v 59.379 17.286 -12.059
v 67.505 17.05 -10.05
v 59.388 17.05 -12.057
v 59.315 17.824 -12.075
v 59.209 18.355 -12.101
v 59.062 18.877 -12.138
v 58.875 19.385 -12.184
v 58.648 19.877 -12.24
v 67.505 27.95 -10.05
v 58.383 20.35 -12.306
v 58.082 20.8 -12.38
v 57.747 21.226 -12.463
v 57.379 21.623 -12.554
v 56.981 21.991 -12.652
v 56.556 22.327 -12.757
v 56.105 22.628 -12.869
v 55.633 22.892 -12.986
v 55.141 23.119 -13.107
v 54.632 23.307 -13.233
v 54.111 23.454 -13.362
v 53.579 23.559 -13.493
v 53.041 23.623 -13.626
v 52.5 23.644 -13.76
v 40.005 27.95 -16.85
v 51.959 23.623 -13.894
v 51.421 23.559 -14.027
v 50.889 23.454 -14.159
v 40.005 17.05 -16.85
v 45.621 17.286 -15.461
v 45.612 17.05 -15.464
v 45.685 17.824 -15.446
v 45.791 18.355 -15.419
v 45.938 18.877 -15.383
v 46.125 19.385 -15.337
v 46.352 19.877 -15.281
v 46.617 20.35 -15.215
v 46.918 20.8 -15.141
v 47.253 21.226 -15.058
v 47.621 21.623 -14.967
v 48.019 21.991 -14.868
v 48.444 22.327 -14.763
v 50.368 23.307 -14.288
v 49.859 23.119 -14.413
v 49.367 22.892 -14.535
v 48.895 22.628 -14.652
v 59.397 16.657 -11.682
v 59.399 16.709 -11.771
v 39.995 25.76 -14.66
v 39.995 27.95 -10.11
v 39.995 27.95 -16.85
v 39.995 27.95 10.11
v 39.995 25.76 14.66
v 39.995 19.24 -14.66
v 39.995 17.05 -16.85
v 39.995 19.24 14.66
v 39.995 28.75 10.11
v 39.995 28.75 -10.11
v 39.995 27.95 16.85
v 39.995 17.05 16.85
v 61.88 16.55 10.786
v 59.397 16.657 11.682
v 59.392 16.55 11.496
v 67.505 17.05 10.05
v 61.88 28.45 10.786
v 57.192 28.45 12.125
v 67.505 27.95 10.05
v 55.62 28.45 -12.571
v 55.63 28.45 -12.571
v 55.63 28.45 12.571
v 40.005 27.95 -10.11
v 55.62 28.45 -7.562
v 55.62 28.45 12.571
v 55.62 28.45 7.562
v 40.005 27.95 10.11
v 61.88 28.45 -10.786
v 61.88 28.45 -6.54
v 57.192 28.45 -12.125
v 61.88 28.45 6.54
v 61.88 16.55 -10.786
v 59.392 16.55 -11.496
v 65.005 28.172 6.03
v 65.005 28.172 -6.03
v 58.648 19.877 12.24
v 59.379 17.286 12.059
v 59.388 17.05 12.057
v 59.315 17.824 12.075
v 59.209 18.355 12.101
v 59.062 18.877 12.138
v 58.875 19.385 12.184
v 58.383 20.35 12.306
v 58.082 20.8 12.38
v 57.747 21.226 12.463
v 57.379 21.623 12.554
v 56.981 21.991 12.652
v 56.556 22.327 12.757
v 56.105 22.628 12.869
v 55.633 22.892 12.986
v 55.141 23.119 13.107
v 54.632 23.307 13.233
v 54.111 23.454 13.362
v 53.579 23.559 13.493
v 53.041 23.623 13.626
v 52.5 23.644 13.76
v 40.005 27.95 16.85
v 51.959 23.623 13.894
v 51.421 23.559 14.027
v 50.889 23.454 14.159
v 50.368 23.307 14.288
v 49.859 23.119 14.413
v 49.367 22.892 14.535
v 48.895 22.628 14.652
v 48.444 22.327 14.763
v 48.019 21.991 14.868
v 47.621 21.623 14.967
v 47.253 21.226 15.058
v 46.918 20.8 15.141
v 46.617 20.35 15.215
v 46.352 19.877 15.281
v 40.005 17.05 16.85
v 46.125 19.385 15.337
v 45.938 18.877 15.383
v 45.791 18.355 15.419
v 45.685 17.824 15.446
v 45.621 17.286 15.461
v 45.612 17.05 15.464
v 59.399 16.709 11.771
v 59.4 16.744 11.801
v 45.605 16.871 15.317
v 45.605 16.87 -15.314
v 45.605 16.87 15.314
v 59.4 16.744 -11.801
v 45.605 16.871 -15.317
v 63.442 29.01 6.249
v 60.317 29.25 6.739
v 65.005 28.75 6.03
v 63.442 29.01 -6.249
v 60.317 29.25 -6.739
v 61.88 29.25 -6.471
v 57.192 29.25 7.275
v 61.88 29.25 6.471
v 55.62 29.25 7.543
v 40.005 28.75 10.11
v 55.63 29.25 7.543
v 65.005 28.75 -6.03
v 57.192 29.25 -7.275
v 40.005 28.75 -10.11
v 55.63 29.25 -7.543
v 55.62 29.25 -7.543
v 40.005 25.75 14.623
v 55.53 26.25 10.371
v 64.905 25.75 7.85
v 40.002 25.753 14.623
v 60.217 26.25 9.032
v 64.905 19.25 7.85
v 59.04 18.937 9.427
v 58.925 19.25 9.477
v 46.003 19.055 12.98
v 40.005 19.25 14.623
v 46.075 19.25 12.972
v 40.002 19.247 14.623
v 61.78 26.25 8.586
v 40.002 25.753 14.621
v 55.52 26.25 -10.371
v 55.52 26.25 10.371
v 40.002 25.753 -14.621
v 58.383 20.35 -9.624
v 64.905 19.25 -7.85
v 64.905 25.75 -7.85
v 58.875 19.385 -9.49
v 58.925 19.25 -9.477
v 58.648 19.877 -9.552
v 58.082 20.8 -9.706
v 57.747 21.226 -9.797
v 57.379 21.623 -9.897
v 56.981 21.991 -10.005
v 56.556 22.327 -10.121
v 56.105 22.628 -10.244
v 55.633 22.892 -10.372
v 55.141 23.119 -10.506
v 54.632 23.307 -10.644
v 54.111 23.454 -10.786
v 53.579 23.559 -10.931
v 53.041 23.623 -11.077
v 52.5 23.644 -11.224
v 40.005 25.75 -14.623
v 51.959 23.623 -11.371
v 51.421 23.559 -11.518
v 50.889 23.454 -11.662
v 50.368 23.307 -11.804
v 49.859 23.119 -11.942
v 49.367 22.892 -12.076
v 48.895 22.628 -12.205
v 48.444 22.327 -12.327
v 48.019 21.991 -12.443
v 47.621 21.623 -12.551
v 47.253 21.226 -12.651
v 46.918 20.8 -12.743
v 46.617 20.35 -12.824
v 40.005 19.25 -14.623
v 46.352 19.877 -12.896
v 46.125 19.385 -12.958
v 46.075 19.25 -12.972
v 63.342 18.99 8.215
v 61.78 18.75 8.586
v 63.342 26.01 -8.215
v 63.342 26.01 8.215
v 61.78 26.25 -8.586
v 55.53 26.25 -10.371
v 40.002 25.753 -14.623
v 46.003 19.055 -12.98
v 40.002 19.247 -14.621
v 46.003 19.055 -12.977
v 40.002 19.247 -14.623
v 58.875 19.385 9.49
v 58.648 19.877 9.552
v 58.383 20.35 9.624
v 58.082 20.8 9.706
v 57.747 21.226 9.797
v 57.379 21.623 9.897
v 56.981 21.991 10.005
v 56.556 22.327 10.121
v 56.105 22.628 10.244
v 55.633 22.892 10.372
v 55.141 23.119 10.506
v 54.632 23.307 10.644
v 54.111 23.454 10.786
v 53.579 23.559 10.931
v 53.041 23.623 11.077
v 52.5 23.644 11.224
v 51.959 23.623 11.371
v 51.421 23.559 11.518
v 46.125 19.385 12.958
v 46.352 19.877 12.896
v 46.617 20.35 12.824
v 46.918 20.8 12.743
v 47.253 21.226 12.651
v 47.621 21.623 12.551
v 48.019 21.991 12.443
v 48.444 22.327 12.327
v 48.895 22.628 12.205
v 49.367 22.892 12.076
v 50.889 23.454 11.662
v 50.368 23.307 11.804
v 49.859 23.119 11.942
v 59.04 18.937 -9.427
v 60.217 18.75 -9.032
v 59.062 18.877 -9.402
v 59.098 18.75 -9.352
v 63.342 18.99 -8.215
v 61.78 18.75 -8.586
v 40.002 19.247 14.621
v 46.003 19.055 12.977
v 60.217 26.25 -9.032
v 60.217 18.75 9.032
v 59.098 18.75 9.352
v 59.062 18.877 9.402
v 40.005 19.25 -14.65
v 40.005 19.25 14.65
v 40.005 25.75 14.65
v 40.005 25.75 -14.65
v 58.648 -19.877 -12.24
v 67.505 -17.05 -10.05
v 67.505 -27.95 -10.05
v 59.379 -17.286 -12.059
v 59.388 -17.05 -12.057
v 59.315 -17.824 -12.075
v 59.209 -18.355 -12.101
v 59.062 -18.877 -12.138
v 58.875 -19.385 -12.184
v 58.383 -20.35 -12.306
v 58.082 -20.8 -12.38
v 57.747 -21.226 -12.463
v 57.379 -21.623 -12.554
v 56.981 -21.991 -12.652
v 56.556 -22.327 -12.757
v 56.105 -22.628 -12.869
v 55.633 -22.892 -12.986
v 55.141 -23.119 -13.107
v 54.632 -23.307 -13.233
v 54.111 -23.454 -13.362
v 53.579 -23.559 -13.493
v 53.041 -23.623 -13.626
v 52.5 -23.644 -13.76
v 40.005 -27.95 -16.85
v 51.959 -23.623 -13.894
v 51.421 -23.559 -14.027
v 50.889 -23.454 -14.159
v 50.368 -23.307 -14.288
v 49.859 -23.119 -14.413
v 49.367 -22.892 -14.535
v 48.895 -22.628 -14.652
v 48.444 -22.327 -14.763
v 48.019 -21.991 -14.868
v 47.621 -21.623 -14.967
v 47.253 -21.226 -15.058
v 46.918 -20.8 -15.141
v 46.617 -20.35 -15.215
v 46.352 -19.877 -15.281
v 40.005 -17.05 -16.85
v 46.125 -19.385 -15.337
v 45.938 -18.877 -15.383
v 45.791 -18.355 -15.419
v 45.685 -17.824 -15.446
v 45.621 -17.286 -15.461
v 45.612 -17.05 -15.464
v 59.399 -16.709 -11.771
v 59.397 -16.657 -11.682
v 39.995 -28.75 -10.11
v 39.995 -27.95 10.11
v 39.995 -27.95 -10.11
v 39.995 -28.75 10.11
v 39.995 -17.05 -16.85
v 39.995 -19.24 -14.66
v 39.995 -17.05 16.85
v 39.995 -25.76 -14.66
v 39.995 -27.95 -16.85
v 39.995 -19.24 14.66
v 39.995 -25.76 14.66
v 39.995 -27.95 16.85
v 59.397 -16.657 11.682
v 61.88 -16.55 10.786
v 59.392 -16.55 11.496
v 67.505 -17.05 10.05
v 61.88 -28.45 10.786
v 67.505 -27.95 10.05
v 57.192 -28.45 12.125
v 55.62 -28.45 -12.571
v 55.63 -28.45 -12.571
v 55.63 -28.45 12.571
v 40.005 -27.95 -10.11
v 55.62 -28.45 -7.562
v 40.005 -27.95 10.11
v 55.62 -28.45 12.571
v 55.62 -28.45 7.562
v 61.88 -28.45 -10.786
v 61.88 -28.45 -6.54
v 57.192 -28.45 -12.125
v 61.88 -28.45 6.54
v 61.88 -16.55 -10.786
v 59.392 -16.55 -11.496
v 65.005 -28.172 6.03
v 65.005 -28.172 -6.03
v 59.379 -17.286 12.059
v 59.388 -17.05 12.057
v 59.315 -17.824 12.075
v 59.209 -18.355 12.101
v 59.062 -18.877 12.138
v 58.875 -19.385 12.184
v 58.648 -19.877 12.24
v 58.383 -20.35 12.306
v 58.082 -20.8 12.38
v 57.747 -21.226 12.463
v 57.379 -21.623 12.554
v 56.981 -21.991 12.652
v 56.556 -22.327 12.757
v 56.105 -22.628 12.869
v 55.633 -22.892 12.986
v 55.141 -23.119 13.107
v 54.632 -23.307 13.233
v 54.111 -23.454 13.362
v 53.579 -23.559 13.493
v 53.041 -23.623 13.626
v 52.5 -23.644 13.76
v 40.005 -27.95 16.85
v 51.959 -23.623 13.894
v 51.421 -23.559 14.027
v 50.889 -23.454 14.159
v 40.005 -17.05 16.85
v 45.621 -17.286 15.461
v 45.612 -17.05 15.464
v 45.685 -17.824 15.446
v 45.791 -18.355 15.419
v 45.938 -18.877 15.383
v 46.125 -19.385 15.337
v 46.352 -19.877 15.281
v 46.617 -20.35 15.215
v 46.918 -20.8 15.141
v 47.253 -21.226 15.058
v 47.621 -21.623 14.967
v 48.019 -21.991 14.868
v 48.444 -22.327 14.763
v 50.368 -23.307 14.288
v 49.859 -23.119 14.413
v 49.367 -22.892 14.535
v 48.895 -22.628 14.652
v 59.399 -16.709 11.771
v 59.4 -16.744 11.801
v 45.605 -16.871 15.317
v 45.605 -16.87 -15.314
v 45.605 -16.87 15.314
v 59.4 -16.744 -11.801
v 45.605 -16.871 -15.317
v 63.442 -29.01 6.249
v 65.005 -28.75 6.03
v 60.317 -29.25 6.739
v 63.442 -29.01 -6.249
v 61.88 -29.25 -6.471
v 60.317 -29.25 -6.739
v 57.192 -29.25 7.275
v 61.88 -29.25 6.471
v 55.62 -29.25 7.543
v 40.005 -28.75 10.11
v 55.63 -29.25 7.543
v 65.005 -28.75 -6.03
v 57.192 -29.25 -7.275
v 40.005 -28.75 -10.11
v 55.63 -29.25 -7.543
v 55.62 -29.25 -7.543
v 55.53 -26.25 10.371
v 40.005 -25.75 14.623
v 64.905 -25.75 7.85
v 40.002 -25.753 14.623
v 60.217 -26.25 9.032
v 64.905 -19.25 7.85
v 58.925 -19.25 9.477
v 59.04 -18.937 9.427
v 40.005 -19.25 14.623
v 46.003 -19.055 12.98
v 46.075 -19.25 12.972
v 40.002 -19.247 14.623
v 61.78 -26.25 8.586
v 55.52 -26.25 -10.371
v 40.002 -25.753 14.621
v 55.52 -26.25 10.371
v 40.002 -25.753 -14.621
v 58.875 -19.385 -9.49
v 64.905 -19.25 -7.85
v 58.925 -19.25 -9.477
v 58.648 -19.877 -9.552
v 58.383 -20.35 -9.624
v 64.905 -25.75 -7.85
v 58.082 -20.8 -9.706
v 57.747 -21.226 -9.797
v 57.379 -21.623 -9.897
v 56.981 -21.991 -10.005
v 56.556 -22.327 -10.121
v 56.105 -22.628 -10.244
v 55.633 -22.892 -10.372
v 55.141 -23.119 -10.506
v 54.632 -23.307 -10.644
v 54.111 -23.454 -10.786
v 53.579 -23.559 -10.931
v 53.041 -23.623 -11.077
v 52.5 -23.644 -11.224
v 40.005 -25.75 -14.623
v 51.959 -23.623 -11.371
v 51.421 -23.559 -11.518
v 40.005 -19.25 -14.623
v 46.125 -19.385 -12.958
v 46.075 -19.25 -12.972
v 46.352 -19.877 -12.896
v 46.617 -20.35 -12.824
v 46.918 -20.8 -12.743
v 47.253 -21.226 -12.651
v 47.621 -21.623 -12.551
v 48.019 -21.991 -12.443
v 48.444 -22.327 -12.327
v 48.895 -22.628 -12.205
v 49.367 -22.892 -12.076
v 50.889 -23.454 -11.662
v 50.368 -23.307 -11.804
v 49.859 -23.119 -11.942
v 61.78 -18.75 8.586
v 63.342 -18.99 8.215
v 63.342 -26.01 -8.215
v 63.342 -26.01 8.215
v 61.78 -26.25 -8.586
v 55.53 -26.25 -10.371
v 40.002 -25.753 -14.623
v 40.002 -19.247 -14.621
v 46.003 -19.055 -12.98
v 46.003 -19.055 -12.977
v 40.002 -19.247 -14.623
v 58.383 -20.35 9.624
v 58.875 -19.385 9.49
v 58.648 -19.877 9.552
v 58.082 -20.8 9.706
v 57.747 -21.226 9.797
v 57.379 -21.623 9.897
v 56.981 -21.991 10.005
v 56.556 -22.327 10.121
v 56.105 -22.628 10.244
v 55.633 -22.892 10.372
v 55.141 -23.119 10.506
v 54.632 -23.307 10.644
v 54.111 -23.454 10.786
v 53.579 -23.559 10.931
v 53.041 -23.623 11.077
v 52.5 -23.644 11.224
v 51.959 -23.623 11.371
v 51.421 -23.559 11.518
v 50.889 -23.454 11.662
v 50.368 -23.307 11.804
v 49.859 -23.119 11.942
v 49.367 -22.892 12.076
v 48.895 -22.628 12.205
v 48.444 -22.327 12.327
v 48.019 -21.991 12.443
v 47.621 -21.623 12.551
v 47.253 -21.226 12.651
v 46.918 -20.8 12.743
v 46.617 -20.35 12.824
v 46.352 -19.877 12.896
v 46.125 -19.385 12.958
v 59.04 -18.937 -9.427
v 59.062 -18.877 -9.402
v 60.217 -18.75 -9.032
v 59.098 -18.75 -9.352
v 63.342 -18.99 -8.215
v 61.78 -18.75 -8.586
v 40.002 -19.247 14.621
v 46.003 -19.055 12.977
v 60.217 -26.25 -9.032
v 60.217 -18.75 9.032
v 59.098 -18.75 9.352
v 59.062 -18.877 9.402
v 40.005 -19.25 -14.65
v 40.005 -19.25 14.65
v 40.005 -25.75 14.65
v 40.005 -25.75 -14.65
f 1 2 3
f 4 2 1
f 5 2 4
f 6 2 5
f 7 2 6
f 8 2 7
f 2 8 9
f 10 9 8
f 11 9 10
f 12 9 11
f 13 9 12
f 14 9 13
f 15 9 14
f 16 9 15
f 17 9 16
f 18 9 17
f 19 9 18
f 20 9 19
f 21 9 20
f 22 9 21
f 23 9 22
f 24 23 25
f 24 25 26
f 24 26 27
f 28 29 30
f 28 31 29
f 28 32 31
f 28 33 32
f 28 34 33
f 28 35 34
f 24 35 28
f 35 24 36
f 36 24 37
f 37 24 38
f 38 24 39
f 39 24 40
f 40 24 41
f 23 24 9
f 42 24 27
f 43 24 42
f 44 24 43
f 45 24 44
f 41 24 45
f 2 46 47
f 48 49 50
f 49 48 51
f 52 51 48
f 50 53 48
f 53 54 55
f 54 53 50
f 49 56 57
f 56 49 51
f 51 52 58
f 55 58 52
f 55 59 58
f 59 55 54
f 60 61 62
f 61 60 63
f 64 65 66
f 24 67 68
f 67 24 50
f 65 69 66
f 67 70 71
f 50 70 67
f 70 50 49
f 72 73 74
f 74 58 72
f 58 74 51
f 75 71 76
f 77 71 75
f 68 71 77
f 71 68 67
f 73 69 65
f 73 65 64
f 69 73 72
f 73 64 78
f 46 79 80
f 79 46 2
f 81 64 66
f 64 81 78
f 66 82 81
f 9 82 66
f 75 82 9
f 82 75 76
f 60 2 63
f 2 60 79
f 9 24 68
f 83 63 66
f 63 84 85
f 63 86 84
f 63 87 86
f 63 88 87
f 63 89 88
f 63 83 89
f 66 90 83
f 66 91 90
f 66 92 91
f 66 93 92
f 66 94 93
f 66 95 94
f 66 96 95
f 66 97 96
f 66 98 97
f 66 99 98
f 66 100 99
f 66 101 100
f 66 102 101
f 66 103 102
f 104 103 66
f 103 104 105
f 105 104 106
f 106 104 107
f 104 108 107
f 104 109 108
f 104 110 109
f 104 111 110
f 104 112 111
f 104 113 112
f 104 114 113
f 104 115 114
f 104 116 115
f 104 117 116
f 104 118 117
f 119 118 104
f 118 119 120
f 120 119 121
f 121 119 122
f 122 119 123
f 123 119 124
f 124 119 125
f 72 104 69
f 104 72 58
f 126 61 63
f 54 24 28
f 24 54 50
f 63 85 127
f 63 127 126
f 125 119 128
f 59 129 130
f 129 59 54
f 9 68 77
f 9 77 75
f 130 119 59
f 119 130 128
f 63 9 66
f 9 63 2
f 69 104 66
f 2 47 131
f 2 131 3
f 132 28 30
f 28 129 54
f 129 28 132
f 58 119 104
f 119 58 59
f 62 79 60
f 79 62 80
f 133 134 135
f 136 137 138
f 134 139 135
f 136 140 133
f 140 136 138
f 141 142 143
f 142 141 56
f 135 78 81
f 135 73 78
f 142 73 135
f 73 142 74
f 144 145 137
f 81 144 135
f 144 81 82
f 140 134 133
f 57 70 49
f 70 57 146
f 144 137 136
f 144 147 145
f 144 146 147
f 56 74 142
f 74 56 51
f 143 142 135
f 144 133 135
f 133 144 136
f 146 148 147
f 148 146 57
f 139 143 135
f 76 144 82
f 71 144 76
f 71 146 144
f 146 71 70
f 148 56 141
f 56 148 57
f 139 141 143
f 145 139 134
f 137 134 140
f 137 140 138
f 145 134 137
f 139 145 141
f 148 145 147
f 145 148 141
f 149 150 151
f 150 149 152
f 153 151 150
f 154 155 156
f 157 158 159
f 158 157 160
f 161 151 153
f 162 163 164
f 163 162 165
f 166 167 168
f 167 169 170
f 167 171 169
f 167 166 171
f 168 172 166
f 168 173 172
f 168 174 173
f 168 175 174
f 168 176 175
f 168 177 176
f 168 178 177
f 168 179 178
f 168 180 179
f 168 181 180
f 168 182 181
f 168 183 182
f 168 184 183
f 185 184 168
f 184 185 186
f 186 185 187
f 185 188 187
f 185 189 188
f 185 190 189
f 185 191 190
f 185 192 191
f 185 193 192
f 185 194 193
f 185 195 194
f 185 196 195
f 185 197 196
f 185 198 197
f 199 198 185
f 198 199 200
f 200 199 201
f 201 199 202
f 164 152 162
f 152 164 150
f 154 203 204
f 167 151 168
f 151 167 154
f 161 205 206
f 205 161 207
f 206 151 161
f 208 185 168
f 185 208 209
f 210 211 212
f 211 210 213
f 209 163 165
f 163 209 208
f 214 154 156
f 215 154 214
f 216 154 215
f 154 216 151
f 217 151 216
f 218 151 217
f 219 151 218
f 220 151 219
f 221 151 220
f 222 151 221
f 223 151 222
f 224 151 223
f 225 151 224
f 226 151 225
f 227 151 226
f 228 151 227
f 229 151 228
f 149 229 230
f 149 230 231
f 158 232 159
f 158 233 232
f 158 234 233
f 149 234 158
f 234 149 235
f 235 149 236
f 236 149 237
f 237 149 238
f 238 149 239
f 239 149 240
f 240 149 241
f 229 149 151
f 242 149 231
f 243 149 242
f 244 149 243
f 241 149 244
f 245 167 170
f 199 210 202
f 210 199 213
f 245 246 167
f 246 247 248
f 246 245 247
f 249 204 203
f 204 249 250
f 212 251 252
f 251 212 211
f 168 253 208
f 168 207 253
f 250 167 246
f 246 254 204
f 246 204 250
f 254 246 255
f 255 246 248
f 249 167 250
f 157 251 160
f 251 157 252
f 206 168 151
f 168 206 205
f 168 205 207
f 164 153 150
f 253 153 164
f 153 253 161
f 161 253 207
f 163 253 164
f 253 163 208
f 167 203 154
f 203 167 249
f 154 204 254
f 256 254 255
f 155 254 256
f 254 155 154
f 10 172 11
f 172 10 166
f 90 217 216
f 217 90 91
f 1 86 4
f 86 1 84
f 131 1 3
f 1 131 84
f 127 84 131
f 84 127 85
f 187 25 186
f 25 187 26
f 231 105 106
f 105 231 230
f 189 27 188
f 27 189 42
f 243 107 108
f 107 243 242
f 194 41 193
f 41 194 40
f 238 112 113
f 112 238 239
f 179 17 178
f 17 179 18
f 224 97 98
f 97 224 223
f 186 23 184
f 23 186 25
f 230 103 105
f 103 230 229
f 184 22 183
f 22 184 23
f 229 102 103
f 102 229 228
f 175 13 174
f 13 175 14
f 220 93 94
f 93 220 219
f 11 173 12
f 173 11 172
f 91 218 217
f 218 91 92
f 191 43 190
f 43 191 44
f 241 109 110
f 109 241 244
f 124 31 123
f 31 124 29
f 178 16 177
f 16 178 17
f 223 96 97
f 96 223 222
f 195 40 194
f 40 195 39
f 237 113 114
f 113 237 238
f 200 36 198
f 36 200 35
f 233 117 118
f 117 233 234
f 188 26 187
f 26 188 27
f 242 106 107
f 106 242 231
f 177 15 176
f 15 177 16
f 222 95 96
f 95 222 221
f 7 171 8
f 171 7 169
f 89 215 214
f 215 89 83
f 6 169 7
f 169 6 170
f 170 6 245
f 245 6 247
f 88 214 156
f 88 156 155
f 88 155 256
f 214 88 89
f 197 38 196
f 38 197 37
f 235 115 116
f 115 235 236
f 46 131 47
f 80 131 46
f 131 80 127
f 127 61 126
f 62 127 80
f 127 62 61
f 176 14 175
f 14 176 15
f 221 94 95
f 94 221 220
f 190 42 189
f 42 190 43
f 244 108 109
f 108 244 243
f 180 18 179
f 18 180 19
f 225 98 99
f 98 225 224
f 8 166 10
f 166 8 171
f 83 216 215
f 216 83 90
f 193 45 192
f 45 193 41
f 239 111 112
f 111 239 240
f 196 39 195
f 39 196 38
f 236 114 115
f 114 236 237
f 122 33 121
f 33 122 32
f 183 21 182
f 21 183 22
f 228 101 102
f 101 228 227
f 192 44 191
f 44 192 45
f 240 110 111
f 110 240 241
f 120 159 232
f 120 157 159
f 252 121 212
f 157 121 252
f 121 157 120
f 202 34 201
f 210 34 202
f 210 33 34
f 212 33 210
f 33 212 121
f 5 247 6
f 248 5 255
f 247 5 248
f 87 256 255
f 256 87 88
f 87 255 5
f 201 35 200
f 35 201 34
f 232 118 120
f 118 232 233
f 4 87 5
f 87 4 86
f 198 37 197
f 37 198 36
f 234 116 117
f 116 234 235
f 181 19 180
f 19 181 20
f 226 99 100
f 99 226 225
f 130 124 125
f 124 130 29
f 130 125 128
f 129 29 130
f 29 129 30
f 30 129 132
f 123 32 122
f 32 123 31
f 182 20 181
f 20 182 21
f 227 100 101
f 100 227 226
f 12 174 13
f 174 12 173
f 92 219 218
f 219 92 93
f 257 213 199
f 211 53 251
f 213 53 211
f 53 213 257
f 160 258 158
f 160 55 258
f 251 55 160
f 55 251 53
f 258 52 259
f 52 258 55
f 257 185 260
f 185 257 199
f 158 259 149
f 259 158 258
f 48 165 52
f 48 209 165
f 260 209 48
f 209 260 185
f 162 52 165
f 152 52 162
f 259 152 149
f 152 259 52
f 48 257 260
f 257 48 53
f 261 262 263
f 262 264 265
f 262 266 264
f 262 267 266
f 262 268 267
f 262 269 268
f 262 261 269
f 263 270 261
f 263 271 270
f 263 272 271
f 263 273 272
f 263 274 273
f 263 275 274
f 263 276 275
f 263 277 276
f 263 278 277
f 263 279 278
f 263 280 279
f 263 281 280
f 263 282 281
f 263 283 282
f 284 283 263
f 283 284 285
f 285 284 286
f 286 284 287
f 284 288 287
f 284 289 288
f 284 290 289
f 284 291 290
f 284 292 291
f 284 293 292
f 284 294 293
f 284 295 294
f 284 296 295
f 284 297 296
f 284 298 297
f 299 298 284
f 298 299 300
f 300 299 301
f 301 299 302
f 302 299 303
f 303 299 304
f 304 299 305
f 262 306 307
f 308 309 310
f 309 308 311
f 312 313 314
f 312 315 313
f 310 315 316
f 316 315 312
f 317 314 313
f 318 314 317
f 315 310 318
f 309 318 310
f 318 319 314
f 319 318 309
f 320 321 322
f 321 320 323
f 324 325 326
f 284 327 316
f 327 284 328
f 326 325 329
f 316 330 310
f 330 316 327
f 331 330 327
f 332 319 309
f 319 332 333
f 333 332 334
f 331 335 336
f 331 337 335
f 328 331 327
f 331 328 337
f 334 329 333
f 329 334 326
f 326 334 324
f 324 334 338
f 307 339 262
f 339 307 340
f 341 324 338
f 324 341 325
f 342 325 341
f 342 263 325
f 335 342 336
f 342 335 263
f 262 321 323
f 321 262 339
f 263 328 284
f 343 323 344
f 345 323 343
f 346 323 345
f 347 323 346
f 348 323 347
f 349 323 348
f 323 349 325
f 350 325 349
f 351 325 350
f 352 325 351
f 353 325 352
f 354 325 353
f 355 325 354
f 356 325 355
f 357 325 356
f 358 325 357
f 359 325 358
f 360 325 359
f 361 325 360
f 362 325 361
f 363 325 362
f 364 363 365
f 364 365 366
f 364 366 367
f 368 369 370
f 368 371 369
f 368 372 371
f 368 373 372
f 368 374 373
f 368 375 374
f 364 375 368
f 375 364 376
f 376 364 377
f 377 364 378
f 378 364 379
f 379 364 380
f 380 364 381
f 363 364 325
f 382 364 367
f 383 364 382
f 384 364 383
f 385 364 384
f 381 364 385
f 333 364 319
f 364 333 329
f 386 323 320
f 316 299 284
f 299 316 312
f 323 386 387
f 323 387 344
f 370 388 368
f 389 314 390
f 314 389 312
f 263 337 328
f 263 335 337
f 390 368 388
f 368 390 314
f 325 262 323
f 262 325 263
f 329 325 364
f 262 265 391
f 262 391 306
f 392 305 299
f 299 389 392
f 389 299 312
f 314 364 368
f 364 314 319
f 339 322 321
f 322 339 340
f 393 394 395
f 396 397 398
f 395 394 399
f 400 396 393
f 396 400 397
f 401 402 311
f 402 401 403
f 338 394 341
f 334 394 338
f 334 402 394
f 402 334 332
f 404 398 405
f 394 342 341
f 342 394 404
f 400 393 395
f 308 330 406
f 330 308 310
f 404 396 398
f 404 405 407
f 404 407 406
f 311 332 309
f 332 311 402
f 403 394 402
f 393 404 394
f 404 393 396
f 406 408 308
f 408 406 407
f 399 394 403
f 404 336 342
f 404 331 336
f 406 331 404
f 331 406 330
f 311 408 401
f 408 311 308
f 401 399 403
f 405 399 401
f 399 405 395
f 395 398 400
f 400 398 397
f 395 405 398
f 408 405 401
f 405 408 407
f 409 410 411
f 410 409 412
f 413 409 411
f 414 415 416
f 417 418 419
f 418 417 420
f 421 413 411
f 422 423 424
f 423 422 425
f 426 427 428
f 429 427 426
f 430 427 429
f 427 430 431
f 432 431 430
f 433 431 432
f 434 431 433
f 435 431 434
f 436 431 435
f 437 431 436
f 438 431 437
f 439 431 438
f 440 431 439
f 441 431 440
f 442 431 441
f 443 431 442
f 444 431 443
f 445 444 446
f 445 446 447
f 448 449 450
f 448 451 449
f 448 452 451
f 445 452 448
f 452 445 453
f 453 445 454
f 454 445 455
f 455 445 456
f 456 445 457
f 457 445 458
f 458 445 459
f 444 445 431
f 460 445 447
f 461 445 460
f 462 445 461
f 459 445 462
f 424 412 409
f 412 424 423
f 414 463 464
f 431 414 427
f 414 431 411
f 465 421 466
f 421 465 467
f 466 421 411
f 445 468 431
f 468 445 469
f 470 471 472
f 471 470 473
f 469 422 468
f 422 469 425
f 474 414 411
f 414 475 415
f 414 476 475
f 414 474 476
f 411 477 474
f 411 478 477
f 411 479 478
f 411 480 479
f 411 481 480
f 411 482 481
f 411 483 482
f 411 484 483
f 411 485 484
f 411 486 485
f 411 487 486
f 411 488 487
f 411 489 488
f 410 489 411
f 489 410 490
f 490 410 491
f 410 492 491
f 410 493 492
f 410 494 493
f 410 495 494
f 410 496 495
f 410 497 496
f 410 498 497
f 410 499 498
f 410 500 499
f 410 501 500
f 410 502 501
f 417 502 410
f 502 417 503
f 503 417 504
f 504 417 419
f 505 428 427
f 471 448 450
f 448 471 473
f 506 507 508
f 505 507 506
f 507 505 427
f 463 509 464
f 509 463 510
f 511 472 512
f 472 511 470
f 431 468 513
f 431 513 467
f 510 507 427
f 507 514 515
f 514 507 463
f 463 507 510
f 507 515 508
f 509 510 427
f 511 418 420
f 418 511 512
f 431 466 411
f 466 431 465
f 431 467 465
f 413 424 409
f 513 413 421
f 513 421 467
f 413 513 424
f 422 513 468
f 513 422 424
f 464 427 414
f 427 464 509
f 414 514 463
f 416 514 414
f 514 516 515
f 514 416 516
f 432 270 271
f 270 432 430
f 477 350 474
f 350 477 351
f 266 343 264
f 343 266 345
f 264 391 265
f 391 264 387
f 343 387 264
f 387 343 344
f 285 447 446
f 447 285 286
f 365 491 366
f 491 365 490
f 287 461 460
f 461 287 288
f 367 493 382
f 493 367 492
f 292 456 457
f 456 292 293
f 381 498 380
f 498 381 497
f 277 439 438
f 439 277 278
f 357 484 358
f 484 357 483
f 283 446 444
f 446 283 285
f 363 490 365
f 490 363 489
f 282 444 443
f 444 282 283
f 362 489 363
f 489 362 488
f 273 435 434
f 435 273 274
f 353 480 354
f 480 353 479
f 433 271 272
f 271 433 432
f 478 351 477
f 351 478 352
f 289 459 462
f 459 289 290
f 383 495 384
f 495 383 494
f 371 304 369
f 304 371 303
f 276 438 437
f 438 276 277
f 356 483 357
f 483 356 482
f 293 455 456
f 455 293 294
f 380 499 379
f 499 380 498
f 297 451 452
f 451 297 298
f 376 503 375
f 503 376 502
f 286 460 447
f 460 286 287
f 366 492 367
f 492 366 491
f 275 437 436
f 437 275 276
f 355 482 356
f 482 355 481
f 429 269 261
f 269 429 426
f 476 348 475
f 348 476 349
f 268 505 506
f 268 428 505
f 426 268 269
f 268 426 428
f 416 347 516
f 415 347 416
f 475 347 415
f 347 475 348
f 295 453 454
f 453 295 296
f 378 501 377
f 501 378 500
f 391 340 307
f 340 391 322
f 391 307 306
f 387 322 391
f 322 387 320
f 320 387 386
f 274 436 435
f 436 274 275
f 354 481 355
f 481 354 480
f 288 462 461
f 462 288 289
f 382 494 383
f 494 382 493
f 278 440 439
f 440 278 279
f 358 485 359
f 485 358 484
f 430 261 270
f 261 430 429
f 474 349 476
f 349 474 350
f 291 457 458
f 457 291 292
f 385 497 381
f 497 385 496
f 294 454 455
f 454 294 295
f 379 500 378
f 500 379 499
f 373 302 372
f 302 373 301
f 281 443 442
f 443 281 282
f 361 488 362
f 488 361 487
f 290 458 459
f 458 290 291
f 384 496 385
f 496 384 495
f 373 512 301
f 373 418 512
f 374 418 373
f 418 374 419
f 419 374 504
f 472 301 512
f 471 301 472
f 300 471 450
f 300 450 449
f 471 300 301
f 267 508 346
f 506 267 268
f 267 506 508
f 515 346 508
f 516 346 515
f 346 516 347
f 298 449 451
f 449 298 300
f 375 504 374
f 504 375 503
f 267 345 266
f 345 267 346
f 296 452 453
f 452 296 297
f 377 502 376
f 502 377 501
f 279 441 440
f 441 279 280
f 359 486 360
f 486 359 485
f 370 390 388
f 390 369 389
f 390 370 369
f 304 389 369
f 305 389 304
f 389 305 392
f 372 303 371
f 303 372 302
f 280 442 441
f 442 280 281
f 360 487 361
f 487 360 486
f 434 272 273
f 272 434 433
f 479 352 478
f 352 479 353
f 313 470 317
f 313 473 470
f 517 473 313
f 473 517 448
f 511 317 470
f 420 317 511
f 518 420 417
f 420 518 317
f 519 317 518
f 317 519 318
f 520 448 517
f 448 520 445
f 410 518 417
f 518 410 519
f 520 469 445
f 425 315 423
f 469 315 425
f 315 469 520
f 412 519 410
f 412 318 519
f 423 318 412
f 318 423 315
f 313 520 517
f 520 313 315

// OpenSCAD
// ============================================================
//  OMX_F Gripper — Tube-Grip Tip Insert
//  Target: 13 mm OD glass test tube held VERTICALLY (tube axis = Z)
//  Zone  : blade X = 40 → 65 mm (finger-local frame)
//  Print : TPU 95A recommended (glass-safe, high friction)
//
//  Retention strategy (top-view layout along finger length)
//  ────────────────────────────────────────────────────────
//   X=40 ─── 45.6 ──── 59.4 ─── 65 ── 67.5
//   |  GRIP  |  CRADLE  |  GRIP  |CAP|
//    (-X wrap   (-Y cut    (+X wrap  (closed
//     full      for tube)   full)    tip past
//     blade)                          blade)
//
//   • GRIP zones: insert wraps blade on all 4 sides (Y±, Z±) →
//     friction fit + clip_lip on +Y face holds insert on blade.
//   • CAP: solid material past blade tip stops insert from sliding
//     off in +X direction. Blade tip butts against inside of cap.
//   • CRADLE: cylindrical cut (axis ‖ Z) on -Y face for vertical
//     tube. Two fingers' bites combine into full circle when closed.
//   • Mirrored in Y for link7 (inner face = +Y).
// ============================================================

// ── USER PARAMETERS ─────────────────────────────────────────

tube_od       = 13.0;   // target tube outer diameter (mm)
tube_clear    = 0.4;    // gap between tube and cradle (mm)
clearance     = 0.25;   // blade fit clearance (mm) — reduce if loose
wall          = 2.2;    // min wall around blade (mm)
clip_lip      = 0.8;    // snap-fit undercut depth on outer Y face (mm)
cap_thick     = 2.5;    // closed tip cap past blade tip (mm) — +X retention
cradle_x_frac = 0.5;    // tube center along insert X: 0=start, 1=end (0.5=mid)
cradle_sink   = 0.0;    // mm to recess tube center into +Y past inner face
                        //   0 = exact half-cylinder cut (cradle = half tube)
                        //   >0 = deeper bite (more grip, less Y material)
show_phantom  = false;  // show translucent blade for alignment check
which_finger  = "both"; // "link6" | "link7" | "both"

// ── BLADE CROSS-SECTION TABLE (X=40..65 zone) ───────────────
//   [ X, half_Y, half_Z ]  — measured via trimesh.section()
blade_pts = [
    [ 40, 3.0, 14.4 ],
    [ 46, 2.8, 12.7 ],
    [ 55, 3.5, 10.3 ],
    [ 62, 3.5,  8.3 ],
    [ 65, 3.0,  7.6 ],
];

X_START = 40;
X_END   = 65;
INS_LEN = X_END - X_START;  // 25 mm

// ── DERIVED ──────────────────────────────────────────────────
tube_r   = tube_od / 2;
cradle_r = tube_r + tube_clear;          // cradle radius (cut)
X_CTR    = X_START + cradle_x_frac * INS_LEN;

// ── HELPERS ──────────────────────────────────────────────────
function lerp(a, b, t) = a + (b-a)*t;

// Find segment index i s.t. blade_pts[i].x <= x < blade_pts[i+1].x
function seg(x, i=0) =
    (i >= len(blade_pts)-2) ? i :
    (x <= blade_pts[i+1][0]) ? i : seg(x, i+1);

function bhy(x) =
    let(i = seg(x), x0 = blade_pts[i][0], x1 = blade_pts[i+1][0])
    lerp(blade_pts[i][1], blade_pts[i+1][1], (x-x0)/(x1-x0));

function bhz(x) =
    let(i = seg(x), x0 = blade_pts[i][0], x1 = blade_pts[i+1][0])
    lerp(blade_pts[i][2], blade_pts[i+1][2], (x-x0)/(x1-x0));

N = 16;  // hull slices

// ── MODULES ──────────────────────────────────────────────────

// Outer body: blade envelope + wall, extended past tip by cap_thick.
// Cavity stops at X_END → x=X_END..X_END+cap_thick is solid (tip cap).
module insert_outer() {
    hull() {
        for (i = [0:N]) {
            x = X_START + i * INS_LEN / N;
            hy = bhy(x) + wall + clearance;
            hz = bhz(x) + wall + clearance;
            translate([x, 0, 0])
                cube([0.01, hy*2, hz*2], center=true);
        }
        // Tip cap slice (same Y/Z dims as X_END)
        hy_end = bhy(X_END) + wall + clearance;
        hz_end = bhz(X_END) + wall + clearance;
        translate([X_END + cap_thick, 0, 0])
            cube([0.01, hy_end*2, hz_end*2], center=true);
    }
}

// Blade cavity (blade shape + clearance)
module blade_cavity() {
    // Full pass-through cavity — open at X_START end for sliding
    translate([-0.1, 0, 0])   // extend slightly past start
    hull()
        for (i = [0:N]) {
            x = X_START + i * INS_LEN / N;
            hy = bhy(x) + clearance;
            hz = bhz(x) + clearance;
            translate([x, 0, 0])
                cube([0.01, hy*2, hz*2], center=true);
        }
}

// Cylindrical tube cradle — axis ‖ Z (vertical tube).
// Cut center sits on (or sinks past) the inner -Y face; the cylinder
// removes a half-circle bite from the insert in the XY plane. The two
// fingers' bites combine into a full cylinder when the gripper closes.
module tube_cradle() {
    face_y = -(bhy(X_CTR) + wall + clearance);   // inner -Y face at X_CTR
    cy     = face_y + cradle_sink;               // tube axis Y
    // height: full Z extent of insert + margin (cuts through top/bottom)
    h_z = max(bhz(X_START), bhz(X_END)) * 2 + 2*wall + 4*clearance + 10;
    translate([X_CTR, cy, 0])
        cylinder(r = cradle_r, h = h_z, center = true, $fn = 80);
}

// Snap-fit clip lip on outer +Y face (keeps insert from sliding off blade)
module clip_lip() {
    hull()
        for (i = [0:N]) {
            x = X_START + i * INS_LEN / N;
            hy_out = bhy(x) + wall + clearance;
            hz_out = bhz(x) + wall + clearance;
            translate([x, hy_out, 0])
                cube([0.01, clip_lip*2, hz_out*1.2], center=true);
        }
}

// Full-finger phantom (pivot + housing + entire blade x=-10..65).
// Hull of slabs over the whole link6 finger envelope from STL data.
// Cyan translucent — for visual alignment of insert vs full gripper.
full_finger_pts = [
    // [ x, half_Y, half_Z ]  — housing/pivot uses bbox half-extents
    [-10, 10.0, 21.3 ],   // pivot shaft / housing back
    [  0, 10.0, 21.3 ],   // housing front
    [ 22, 10.0, 21.3 ],   // housing/blade boundary (housing dominates here)
    [ 22,  5.7, 19.4 ],   // blade base
    [ 28,  4.2, 17.7 ],
    [ 36,  3.1, 15.5 ],
    [ 46,  2.8, 12.7 ],
    [ 55,  3.5, 10.3 ],
    [ 62,  3.5,  8.3 ],
    [ 65,  3.0,  7.6 ],   // tip
];

module finger_zone_hull(i0, i1) {
    hull()
        for (i = [i0:i1]) {
            p = full_finger_pts[i];
            translate([p[0], 0, 0])
                cube([0.01, p[1]*2, p[2]*2], center=true);
        }
}

module blade_phantom() {
    color("cyan", 0.25) {
        // Housing block (x=-10..22): straight box, no taper
        finger_zone_hull(0, 2);
        // Blade taper (x=22..65)
        finger_zone_hull(3, len(full_finger_pts)-1);
    }
}

// Entry lead-in: chamfer the open end (X_START side) so blade slides in
module entry_chamfer() {
    ch = 1.5;  // chamfer size
    hull() {
        // Normal profile at X_START
        translate([X_START, 0, 0]) {
            hy = bhy(X_START) + clearance;
            hz = bhz(X_START) + clearance;
            cube([0.01, hy*2, hz*2], center=true);
        }
        // Enlarged profile slightly before X_START
        translate([X_START - ch, 0, 0]) {
            hy = bhy(X_START) + clearance + ch;
            hz = bhz(X_START) + clearance + ch;
            cube([0.01, hy*2, hz*2], center=true);
        }
    }
}

// Complete insert for link6 (inner = -Y)
module insert_link6() {
    difference() {
        union() {
            insert_outer();
            clip_lip();         // snap ridge on outer +Y
        }
        blade_cavity();
        tube_cradle();      // half-cylinder cut for vertical tube on -Y face
        entry_chamfer();
    }
    if (show_phantom) blade_phantom();
}

// Complete insert for link7 (inner = +Y, mirror of link6)
module insert_link7() {
    scale([1, -1, 1])
        insert_link6();
}

// ── RENDER ───────────────────────────────────────────────────
SEP = 45;  // Y separation when showing both

if (which_finger == "link6") {
    insert_link6();
} else if (which_finger == "link7") {
    insert_link7();
} else {
    translate([0,  SEP/2, 0]) insert_link6();
    translate([0, -SEP/2, 0]) insert_link7();
}

// ============================================================
//  PRINT GUIDE
// ─────────────────────────────────────────────────────────────
//  Material  : TPU 95A  (Shore hardness gives compliance +
//              grip on glass; PLA/PETG alternative if no TPU)
//  Orientation: stand on +X end — Z axis vertical = cradle axis vertical
//              (avoids supports inside the cradle arc).
//  Layer h   : 0.15 mm for smooth cradle surface
//  Walls     : 3 perimeters (no infill needed — solid is fine
//              for such a small part)
//  Supports  : none needed
//
//  FIT TUNING
//  ──────────
//  Too loose on blade → decrease clearance (try 0.15)
//  Too tight          → increase clearance (try 0.35)
//  Clip doesn't snap  → increase clip_lip (try 1.2)
//
//  TUBE CRADLE GEOMETRY (13 mm tube, vertical = Z axis)
//  ─────────────────────────────────────────────────────
//  cradle radius      : 6.5 + tube_clear mm
//  cradle axis        : Z (tube vertical)
//  cradle center X    : X_START + cradle_x_frac * INS_LEN  (default mid)
//  bite shape         : half-cylinder cut into inner Y face
//  → two fingers' bites = full circle around tube when closed
//  → tube extends vertically through the open ends in Z
//
//  GEOMETRY CONSTRAINT
//  ───────────────────
//  Tube radius (6.5 mm) > finger half-Y at tip (~3 mm), so the cradle
//  cuts past the finger centerline in Y. This is expected: the cradle
//  is shared between both fingers when closed. The +Y wall remains
//  ~(half_Z + wall - cradle_r) thick — verify visually before printing.
// ============================================================
